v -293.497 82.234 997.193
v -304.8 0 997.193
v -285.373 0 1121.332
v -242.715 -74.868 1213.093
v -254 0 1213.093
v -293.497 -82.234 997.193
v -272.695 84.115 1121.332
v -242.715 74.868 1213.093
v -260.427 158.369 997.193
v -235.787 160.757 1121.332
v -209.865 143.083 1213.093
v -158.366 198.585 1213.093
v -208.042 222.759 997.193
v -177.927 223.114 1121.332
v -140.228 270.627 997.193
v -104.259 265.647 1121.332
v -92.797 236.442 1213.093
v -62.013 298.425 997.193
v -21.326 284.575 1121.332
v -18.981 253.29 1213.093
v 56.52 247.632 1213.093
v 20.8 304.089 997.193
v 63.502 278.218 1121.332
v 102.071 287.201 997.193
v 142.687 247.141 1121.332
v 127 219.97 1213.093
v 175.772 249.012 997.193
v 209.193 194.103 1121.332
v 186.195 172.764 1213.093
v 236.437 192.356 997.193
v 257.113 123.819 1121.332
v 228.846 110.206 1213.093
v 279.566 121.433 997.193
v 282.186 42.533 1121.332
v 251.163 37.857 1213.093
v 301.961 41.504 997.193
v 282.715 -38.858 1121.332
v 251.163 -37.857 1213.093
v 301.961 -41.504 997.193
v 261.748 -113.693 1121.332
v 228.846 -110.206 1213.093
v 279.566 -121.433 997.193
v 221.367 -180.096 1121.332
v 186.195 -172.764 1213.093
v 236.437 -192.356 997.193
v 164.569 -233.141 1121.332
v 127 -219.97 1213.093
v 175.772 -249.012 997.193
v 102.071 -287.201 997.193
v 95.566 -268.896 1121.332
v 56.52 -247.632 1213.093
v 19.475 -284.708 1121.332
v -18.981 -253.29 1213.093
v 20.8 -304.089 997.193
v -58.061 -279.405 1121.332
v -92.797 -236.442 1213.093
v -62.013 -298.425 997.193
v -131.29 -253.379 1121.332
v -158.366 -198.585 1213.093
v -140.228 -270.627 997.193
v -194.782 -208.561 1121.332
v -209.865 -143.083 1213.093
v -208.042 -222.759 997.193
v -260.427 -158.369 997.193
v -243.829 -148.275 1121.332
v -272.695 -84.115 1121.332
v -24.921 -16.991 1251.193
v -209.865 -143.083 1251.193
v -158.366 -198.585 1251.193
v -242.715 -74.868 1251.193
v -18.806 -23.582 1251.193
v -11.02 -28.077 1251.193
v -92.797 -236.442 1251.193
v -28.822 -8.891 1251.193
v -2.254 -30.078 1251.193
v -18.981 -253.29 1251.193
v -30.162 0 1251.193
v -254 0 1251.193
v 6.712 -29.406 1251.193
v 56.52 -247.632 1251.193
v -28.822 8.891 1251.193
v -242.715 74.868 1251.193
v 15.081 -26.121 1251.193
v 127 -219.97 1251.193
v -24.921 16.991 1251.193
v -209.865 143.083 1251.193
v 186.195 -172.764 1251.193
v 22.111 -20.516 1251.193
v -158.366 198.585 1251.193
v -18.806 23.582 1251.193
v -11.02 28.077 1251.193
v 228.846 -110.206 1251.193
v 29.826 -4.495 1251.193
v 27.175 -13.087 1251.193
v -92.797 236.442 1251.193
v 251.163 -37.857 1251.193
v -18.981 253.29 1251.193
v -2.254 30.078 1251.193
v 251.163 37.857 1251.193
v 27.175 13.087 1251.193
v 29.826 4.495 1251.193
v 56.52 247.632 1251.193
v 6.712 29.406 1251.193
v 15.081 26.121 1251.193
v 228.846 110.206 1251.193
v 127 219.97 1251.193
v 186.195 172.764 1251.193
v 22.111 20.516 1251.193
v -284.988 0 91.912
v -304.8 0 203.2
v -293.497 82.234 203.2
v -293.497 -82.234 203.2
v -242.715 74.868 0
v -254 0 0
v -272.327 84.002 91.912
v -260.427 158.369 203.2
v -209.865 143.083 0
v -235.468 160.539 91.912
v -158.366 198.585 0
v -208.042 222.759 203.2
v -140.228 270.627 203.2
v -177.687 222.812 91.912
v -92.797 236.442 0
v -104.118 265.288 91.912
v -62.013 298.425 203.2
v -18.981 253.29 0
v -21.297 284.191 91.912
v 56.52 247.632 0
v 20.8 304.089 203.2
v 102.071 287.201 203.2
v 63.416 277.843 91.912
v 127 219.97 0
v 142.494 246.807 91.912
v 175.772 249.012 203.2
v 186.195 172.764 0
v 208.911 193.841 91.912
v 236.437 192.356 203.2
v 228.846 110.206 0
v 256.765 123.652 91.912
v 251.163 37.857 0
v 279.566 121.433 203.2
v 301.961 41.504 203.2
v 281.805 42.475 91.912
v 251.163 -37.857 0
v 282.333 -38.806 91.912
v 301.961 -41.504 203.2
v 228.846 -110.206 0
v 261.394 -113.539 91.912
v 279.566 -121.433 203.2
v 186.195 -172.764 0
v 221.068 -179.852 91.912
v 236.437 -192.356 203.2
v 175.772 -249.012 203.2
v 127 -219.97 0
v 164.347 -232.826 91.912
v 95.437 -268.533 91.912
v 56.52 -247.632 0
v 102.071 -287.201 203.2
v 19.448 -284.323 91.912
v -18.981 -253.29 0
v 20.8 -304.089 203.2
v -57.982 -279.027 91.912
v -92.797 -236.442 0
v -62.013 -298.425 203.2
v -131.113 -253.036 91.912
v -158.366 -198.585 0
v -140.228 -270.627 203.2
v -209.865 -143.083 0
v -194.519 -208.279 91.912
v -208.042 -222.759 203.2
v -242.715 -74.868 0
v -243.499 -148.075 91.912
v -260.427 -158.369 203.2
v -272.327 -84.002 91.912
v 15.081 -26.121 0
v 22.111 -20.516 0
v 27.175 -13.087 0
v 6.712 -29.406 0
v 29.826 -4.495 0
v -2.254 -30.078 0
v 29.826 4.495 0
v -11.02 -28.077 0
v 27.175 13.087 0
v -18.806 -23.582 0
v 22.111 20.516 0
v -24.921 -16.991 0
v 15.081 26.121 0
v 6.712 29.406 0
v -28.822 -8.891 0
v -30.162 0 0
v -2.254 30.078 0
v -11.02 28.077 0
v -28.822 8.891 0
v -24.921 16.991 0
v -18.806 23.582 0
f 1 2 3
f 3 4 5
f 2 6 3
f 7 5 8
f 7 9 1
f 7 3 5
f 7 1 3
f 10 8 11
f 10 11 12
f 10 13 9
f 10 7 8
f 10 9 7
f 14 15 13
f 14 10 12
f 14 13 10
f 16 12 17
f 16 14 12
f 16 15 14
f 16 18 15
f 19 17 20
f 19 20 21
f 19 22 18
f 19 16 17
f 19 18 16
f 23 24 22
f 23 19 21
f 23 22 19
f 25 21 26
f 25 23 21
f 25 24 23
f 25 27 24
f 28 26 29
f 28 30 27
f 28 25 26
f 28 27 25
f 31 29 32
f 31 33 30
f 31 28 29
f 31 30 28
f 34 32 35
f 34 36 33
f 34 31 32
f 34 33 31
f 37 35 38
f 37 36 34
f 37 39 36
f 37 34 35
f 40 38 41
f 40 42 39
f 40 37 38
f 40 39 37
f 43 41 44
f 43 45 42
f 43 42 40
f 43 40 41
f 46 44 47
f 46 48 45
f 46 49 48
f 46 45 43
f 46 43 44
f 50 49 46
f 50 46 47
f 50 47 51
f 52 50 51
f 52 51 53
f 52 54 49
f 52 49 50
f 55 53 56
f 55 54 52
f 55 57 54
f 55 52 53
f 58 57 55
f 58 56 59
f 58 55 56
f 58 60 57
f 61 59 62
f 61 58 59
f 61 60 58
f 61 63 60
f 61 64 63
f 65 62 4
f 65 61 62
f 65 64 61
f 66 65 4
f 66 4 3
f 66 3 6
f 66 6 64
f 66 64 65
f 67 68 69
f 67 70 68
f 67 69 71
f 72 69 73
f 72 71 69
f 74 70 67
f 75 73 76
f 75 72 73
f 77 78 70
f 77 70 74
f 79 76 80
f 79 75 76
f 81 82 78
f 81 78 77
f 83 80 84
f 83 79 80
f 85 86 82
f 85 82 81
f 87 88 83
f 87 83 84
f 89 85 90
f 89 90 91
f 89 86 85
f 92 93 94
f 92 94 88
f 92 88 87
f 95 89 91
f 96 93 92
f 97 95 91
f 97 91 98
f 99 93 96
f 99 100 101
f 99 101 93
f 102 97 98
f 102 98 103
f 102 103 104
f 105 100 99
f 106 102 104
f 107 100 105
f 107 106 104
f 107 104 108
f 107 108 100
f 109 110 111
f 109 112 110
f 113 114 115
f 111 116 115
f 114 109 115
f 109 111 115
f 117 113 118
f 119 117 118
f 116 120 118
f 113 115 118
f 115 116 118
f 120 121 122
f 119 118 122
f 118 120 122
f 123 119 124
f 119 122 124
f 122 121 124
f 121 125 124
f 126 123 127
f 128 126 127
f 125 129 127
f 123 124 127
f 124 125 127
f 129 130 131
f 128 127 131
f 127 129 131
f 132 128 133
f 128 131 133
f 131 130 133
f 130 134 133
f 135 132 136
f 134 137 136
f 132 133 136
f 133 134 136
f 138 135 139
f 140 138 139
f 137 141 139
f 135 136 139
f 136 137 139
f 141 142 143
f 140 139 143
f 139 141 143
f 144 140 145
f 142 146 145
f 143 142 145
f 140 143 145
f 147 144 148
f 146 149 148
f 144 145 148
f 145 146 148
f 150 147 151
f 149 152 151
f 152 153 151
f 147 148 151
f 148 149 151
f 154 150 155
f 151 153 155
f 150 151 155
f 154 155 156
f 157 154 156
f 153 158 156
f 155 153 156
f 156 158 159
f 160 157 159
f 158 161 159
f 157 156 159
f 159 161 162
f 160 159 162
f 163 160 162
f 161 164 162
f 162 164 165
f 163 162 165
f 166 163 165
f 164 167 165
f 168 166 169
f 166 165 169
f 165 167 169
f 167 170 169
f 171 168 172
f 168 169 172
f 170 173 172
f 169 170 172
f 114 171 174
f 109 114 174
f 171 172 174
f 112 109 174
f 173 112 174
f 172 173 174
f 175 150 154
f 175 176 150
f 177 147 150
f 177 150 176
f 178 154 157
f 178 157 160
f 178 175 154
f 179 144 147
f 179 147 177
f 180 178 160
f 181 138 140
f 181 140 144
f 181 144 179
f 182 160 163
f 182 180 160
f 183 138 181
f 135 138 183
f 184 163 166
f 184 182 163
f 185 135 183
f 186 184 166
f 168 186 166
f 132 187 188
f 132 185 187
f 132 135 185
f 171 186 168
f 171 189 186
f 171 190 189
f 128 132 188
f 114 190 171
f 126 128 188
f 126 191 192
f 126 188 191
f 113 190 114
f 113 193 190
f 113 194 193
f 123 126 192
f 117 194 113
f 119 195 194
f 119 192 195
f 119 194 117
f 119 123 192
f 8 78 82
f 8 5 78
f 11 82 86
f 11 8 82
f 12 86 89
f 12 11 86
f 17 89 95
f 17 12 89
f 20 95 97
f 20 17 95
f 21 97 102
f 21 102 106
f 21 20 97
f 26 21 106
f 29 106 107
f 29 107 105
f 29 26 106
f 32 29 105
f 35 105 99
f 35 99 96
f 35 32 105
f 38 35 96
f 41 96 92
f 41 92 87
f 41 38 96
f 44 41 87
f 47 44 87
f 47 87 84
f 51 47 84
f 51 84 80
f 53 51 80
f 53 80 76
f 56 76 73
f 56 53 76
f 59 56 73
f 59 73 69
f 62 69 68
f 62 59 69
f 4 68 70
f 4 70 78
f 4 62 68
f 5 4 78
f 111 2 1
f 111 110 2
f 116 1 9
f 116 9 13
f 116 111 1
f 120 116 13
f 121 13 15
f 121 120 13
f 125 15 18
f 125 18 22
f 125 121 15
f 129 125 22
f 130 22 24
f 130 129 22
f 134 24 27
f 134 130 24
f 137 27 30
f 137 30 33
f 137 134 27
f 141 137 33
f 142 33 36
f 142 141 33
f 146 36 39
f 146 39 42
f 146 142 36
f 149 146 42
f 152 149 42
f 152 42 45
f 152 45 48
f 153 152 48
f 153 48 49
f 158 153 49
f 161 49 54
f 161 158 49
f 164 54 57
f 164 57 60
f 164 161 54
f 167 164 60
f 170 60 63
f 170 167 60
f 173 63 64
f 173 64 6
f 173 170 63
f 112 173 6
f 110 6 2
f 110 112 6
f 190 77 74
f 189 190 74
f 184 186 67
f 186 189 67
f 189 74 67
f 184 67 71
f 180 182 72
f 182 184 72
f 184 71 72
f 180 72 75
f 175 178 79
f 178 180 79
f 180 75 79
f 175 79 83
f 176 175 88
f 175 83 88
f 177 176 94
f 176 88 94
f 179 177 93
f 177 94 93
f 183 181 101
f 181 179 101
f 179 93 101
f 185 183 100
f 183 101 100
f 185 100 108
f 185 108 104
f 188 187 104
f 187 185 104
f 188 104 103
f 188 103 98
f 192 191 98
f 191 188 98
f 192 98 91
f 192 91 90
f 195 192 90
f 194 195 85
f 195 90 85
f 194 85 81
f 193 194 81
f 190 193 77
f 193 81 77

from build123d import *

# Parameters (mm, degrees)
F3_D           = 60.325
F3_CBORE_D     = 60.325
F3_CBORE_DEPTH = 4.826


with BuildPart() as f1:
    # F0 (on Front) → F1 (revolve)
    with BuildSketch(Plane.XZ):
        with BuildLine():
            Line((0, 184.3925616264), (0, 1251.1925616264))
            Line((0, 1251.1925616264), (-254, 1251.1925616264))
            Line((-254, 1251.1925616264), (-254, 1213.0925616264))
            add(Edge.make_bspline(
                [(-254, 1213.0925616264), (-264.7863300499, 1186.664170065), (-288.7208143023, 1128.0205054709), (-299.0989058542, 1043.5793898388), (-304.8, 997.1925616264)],
                knots=[0, 0, 0, 0, 0.4506606424, 1, 1, 1, 1], degree=3))
            Line((-304.8, 997.1925616264), (-304.8, 203.2))
            add(Edge.make_bspline(
                [(-254, 0), (-264.8896198837, 28.1579660638), (-288.0059983927, 87.9314208331), (-298.9902100194, 163.3234862316), (-304.8, 203.2)],
                knots=[0, 0, 0, 0, 0.4710781094, 1, 1, 1, 1], degree=3))
            Line((-254, 0), (0, 0))
            Line((0, 0), (0, 184.3925616264))
        make_face()
    revolve(axis=Axis((0, 0, 717.7925616264), (0, 0, -1)))

    # F3 (through all)
    with Locations(Plane(origin=(0, 0, 0), x_dir=(1, 0, 0), z_dir=(0, 0, -1))):
        with Locations((0, 0)):
            CounterBoreHole(F3_D / 2, F3_CBORE_D / 2, F3_CBORE_DEPTH)


solid = f1.part
